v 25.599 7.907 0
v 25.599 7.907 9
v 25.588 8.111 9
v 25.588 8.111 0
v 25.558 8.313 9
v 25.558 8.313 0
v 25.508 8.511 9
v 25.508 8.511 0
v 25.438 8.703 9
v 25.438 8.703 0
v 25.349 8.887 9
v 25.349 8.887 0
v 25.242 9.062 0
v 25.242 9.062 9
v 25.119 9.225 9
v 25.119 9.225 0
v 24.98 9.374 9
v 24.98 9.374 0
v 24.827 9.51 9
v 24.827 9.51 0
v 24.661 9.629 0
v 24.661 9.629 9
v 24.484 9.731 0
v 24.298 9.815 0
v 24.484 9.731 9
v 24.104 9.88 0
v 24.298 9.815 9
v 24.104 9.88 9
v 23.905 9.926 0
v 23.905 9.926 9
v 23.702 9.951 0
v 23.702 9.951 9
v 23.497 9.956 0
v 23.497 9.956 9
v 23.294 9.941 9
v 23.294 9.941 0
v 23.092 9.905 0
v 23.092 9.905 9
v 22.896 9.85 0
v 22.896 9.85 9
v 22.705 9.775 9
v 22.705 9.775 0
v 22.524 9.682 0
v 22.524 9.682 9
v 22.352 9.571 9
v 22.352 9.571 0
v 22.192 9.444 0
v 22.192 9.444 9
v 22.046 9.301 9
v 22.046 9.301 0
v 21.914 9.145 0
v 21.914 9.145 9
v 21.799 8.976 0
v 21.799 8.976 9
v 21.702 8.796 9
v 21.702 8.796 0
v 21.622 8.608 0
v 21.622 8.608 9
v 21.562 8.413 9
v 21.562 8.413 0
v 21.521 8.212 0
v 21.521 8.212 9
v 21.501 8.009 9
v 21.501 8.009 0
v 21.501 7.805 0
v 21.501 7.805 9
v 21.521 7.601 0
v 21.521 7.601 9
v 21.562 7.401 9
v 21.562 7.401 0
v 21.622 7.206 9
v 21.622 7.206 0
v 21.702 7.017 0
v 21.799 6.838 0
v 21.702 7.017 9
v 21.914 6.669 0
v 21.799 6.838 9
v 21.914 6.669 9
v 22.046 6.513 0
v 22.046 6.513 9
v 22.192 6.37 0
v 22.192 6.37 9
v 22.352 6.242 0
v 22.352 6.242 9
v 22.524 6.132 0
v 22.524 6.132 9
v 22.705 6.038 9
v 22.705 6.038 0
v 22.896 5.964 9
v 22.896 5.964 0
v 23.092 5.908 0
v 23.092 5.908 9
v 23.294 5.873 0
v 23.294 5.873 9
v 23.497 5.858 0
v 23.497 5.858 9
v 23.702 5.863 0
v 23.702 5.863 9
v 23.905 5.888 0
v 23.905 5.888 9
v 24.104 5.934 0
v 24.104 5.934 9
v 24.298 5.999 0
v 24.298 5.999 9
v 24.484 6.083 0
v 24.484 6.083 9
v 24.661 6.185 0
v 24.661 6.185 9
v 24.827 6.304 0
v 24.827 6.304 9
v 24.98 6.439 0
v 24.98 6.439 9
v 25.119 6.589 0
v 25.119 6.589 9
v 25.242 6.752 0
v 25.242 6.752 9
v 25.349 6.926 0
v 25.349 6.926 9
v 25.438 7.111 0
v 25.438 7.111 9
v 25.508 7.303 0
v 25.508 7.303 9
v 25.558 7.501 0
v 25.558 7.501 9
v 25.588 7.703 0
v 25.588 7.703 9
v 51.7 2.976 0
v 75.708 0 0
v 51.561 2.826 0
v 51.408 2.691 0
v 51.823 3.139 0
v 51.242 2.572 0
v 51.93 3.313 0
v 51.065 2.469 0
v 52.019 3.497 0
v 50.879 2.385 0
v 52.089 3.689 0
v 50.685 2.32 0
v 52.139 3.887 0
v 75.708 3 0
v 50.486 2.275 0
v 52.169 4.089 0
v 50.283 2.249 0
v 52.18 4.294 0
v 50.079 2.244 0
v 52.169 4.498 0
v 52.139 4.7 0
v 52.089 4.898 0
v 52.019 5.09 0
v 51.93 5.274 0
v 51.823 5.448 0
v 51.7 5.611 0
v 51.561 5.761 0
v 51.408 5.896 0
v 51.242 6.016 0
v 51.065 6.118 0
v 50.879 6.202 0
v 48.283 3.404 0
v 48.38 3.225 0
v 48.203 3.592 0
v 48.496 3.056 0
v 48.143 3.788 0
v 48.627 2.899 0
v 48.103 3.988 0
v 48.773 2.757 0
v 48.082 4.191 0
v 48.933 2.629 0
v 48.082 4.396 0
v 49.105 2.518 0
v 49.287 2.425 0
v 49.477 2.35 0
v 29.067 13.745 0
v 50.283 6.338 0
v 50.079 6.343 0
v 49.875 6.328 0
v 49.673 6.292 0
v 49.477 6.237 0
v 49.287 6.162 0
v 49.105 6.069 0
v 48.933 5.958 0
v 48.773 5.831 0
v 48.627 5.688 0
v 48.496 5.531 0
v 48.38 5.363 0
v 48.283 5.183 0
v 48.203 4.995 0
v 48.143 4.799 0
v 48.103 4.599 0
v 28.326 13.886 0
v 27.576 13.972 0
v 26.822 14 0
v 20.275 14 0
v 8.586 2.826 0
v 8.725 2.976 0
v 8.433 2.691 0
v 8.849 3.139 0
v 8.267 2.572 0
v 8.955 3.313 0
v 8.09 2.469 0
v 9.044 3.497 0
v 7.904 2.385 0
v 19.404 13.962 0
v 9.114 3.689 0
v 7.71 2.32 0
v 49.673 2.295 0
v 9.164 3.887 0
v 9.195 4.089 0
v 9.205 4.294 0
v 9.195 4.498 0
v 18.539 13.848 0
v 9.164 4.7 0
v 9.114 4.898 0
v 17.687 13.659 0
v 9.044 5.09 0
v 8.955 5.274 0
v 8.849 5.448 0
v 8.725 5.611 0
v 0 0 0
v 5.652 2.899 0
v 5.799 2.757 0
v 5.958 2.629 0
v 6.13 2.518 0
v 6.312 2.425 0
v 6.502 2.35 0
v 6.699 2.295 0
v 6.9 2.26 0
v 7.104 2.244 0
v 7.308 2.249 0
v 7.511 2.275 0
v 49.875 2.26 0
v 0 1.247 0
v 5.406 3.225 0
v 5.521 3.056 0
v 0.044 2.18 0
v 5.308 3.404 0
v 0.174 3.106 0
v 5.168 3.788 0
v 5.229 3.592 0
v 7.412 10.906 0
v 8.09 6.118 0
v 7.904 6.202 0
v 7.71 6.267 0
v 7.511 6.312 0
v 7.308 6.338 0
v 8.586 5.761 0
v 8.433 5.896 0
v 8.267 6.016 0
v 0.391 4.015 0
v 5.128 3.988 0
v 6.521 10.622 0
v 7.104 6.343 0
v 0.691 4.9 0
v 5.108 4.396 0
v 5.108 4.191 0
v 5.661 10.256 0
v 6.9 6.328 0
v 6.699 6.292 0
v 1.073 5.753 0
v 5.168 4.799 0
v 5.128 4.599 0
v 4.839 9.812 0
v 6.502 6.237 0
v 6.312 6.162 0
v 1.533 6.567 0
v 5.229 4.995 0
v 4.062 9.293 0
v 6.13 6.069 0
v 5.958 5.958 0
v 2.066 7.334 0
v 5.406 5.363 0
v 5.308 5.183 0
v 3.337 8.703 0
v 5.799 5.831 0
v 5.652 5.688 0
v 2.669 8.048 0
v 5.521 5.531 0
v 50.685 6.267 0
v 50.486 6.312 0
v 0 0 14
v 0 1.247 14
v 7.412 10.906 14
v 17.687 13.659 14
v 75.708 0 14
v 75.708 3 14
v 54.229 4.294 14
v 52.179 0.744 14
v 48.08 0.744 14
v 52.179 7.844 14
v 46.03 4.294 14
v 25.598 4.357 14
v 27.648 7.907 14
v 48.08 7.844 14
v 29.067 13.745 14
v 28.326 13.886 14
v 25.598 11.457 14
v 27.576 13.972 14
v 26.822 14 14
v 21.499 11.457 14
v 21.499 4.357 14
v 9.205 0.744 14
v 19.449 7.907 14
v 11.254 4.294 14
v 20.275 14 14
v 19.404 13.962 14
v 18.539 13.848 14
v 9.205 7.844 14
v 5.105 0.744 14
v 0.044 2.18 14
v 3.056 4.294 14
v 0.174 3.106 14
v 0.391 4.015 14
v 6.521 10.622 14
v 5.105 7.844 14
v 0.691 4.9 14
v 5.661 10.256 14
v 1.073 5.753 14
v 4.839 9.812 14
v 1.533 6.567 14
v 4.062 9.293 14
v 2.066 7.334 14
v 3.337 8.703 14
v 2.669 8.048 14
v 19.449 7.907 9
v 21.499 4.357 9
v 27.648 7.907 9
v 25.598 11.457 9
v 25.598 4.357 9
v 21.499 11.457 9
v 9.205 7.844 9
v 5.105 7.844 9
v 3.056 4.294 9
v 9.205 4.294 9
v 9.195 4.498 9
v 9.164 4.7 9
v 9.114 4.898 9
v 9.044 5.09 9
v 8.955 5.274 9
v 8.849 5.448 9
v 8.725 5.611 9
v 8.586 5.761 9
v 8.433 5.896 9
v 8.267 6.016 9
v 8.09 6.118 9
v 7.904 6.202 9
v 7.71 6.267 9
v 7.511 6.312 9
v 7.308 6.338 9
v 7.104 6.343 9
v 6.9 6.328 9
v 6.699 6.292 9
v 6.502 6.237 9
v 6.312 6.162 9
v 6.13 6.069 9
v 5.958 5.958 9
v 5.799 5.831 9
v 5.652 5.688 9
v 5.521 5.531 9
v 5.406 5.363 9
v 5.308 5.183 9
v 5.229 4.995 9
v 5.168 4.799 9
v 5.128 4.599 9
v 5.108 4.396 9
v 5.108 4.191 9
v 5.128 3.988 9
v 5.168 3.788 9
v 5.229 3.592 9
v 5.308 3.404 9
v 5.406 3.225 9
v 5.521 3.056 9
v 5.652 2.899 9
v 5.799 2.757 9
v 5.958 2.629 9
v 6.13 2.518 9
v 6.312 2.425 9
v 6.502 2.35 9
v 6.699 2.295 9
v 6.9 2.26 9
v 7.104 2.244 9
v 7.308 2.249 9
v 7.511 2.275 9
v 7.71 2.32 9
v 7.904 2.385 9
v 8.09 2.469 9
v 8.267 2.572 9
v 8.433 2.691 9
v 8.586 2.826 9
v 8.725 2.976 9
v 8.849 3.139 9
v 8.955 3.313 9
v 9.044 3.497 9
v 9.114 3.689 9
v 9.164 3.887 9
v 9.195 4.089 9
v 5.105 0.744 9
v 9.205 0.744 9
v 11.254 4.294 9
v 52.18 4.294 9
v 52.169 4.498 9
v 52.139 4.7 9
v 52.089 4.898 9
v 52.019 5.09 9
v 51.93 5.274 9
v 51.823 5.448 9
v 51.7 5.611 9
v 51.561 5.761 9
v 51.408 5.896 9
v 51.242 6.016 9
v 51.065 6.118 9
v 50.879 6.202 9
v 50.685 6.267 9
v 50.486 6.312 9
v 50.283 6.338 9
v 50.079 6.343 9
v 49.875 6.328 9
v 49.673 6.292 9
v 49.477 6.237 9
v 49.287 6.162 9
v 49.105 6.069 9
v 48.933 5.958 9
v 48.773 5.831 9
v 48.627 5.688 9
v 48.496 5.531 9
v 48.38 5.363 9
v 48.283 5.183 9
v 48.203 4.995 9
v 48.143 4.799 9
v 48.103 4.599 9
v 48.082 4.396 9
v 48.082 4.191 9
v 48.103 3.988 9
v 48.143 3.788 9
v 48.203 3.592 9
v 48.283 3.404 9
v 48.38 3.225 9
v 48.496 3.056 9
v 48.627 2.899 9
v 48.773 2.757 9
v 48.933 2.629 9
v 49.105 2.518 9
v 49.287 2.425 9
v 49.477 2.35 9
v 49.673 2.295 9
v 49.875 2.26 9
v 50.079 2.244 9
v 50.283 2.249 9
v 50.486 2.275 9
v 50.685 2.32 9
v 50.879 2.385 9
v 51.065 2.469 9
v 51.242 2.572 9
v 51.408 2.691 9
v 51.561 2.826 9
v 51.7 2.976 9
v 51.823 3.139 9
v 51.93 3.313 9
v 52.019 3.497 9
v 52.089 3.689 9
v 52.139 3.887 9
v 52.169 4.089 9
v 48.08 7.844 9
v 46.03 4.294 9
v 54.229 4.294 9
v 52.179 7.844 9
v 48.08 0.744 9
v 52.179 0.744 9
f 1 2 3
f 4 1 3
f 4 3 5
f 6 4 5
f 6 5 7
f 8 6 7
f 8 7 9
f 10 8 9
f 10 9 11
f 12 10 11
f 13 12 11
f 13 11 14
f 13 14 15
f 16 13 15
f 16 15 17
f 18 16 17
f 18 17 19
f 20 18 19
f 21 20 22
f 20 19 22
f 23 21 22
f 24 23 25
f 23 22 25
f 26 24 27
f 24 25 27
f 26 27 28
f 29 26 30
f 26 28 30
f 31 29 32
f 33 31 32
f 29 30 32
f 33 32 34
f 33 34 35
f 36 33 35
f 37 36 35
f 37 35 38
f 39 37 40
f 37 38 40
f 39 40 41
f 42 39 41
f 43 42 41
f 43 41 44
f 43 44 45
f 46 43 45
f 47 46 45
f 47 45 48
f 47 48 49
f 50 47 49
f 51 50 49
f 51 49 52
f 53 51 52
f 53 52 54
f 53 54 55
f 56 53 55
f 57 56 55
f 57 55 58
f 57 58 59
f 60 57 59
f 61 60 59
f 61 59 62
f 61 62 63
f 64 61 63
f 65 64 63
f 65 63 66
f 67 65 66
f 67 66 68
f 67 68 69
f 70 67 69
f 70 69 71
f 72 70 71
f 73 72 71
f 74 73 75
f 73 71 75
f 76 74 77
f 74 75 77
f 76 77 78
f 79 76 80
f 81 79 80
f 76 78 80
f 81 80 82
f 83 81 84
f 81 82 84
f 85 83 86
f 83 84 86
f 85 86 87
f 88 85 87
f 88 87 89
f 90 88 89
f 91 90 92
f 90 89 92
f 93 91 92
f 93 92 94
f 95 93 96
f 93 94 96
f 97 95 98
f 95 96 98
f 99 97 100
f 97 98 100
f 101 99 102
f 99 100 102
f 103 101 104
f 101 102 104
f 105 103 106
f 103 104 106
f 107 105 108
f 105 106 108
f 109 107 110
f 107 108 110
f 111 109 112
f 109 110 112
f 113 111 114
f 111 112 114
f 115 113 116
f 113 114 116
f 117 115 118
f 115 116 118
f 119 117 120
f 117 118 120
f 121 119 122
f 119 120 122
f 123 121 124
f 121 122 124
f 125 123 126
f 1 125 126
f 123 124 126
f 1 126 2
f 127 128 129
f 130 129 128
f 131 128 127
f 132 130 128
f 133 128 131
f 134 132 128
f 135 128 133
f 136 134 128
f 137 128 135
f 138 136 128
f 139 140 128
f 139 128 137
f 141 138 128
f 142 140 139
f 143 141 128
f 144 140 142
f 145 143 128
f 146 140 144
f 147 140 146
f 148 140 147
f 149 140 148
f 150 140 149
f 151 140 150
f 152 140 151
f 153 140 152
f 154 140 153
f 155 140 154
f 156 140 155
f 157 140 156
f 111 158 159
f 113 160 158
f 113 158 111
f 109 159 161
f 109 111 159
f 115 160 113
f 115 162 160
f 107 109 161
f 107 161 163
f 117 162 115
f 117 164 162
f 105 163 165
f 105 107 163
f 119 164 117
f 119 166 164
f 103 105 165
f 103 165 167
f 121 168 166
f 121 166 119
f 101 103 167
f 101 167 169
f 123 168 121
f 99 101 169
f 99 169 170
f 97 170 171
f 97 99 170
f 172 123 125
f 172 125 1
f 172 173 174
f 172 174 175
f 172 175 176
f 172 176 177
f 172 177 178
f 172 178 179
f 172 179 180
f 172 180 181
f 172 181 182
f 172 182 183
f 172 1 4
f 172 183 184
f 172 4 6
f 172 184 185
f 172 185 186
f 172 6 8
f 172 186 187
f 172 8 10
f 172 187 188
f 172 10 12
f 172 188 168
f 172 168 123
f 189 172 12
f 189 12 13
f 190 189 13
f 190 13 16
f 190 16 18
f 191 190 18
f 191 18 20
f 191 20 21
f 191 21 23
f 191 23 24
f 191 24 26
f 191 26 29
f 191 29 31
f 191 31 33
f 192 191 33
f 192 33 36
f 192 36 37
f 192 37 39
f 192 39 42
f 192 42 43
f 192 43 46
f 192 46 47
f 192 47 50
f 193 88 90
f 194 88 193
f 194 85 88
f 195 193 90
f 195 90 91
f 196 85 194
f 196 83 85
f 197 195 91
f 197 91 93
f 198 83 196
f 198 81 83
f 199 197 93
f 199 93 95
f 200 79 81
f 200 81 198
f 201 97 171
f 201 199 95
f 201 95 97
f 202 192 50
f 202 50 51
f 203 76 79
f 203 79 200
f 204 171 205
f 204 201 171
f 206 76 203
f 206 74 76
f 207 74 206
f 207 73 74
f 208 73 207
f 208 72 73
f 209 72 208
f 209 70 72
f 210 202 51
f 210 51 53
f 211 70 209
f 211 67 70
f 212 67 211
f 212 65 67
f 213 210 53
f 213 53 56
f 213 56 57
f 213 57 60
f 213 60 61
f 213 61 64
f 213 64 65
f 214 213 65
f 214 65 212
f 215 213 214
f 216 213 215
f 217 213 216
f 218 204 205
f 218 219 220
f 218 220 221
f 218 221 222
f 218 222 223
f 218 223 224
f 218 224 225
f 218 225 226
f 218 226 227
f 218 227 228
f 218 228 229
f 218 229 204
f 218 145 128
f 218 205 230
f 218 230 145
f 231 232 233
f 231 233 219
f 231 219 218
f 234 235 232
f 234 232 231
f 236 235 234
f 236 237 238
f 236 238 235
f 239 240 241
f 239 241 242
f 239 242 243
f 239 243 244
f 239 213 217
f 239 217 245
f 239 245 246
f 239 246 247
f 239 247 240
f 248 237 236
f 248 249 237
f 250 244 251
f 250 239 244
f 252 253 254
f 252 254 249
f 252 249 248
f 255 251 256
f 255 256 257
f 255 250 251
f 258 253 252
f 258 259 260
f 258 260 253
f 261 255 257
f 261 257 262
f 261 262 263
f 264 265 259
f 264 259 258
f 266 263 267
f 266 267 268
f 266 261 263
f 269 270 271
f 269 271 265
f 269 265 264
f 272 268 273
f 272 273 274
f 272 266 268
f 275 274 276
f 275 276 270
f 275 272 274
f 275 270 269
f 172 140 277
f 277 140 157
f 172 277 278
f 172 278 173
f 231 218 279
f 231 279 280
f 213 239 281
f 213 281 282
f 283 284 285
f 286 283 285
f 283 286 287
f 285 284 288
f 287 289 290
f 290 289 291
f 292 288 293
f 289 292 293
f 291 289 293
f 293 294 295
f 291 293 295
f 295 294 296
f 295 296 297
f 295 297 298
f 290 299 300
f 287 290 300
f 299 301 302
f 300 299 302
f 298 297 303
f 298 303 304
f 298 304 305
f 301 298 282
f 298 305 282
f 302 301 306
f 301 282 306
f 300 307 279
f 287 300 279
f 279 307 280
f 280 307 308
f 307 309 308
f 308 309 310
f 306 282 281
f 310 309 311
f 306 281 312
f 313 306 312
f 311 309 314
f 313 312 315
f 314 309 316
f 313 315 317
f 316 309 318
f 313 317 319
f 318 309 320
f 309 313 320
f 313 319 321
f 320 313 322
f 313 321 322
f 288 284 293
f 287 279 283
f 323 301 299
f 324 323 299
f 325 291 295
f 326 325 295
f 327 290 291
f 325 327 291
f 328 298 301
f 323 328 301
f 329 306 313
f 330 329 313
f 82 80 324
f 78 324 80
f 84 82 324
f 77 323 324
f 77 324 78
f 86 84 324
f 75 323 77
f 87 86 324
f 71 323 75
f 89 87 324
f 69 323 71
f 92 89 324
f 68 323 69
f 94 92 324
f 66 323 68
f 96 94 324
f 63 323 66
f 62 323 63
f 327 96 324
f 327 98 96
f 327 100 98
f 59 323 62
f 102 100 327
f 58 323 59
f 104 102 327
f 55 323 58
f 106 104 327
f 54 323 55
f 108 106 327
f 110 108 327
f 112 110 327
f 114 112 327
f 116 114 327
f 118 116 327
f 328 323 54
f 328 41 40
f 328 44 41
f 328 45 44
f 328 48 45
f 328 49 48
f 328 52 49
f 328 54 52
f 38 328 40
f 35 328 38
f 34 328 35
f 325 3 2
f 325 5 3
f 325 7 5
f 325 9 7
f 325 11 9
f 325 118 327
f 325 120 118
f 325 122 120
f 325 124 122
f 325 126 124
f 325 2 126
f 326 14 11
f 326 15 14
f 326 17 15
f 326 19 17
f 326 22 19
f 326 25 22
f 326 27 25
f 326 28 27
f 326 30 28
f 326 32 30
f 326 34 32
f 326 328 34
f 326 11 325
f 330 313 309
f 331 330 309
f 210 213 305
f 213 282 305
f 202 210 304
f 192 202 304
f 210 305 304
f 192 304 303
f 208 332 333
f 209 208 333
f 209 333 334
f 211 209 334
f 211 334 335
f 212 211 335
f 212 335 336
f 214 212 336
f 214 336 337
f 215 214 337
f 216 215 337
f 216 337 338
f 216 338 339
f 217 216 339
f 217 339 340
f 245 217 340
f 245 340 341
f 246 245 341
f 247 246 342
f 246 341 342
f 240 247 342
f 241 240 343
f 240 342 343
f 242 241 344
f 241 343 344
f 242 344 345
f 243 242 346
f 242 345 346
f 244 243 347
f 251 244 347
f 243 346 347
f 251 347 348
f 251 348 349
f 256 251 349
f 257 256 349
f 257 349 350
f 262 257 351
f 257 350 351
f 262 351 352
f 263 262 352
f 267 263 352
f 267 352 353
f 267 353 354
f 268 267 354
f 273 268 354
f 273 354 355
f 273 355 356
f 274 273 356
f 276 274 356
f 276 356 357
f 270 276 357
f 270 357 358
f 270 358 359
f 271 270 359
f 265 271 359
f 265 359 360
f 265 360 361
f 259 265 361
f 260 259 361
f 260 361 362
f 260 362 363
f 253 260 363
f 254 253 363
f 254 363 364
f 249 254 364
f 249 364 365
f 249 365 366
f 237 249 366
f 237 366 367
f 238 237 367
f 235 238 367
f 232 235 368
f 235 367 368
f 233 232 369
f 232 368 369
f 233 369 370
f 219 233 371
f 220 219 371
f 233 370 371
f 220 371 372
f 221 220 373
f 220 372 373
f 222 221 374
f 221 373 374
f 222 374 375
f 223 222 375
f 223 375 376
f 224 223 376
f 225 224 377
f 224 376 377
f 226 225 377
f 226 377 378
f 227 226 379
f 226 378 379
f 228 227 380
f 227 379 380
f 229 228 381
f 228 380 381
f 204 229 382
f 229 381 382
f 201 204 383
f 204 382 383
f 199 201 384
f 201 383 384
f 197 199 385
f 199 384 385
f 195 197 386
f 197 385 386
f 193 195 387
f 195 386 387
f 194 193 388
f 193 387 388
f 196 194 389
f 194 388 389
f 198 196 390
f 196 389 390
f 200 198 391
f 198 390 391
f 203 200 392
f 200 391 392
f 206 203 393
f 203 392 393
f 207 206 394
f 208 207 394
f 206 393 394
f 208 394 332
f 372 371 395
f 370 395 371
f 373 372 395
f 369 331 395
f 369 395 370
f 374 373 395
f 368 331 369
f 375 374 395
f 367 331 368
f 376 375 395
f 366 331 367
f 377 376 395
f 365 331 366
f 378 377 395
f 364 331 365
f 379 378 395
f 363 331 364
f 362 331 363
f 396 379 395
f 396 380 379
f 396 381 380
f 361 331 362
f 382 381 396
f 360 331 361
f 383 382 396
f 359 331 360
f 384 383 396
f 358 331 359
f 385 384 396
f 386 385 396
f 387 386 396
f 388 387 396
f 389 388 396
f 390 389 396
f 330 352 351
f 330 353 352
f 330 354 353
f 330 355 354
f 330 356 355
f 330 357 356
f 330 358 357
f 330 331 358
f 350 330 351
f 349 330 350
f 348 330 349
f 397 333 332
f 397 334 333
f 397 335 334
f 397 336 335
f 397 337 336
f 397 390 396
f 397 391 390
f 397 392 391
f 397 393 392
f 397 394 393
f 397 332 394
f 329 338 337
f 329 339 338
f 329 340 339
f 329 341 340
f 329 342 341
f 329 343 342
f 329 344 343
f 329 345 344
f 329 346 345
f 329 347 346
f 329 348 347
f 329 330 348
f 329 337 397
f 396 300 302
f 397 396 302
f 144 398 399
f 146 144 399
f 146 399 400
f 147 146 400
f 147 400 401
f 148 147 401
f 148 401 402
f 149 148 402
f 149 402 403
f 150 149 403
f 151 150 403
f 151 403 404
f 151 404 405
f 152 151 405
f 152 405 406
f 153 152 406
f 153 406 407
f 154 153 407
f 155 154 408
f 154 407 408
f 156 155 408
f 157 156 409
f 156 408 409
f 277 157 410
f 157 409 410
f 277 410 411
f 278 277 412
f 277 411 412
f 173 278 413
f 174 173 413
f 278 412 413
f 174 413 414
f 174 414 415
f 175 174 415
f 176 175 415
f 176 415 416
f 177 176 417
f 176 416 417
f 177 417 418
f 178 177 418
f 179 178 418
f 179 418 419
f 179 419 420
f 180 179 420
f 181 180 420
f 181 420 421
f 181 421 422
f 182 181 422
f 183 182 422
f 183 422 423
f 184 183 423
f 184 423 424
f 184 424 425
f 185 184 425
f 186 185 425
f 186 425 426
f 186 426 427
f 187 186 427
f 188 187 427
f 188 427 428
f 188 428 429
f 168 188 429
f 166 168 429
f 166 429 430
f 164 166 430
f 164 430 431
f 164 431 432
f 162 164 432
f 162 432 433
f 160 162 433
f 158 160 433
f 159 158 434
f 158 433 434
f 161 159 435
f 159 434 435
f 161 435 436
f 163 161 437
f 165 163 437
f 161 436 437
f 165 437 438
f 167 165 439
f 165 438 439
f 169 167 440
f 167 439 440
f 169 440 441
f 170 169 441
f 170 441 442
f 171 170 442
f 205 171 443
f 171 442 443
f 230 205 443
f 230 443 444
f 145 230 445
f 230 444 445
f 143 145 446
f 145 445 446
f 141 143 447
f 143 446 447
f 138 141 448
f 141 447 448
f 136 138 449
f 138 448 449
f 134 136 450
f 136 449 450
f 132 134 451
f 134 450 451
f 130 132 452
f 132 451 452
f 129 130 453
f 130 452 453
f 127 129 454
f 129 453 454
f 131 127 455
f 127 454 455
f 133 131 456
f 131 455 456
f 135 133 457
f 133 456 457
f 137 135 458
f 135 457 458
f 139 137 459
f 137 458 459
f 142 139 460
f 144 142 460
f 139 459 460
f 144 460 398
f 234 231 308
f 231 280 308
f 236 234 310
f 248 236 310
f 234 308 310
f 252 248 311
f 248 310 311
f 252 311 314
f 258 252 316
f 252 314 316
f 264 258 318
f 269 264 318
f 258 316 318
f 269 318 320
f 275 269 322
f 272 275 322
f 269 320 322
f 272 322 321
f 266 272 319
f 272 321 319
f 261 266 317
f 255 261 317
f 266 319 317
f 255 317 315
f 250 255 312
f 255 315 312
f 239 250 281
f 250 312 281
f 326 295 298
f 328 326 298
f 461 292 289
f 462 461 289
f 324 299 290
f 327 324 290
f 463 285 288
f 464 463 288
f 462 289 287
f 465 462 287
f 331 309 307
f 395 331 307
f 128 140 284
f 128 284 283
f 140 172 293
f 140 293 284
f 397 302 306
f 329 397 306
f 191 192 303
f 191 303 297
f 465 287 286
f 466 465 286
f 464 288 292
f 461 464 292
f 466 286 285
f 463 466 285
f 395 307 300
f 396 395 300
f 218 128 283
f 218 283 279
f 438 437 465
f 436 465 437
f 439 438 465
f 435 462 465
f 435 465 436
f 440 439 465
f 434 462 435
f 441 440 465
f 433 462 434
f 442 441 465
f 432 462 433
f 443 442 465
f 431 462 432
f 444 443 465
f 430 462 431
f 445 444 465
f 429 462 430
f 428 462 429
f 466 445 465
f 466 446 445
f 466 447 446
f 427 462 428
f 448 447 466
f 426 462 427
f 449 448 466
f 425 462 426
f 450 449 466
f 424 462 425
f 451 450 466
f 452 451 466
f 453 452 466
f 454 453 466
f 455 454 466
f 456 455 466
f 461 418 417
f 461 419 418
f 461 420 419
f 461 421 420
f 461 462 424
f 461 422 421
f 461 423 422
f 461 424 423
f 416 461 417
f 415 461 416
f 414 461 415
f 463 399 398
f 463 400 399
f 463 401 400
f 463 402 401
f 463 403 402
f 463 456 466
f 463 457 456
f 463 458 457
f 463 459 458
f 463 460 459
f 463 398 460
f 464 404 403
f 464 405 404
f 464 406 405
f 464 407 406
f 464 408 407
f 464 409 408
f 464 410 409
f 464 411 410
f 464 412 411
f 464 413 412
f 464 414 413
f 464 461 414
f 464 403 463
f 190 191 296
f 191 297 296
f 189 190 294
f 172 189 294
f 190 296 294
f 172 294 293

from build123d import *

# Parameters (mm, degrees)
BOSS_EXTRUDE1_DEPTH = 14
FILLET1_R           = 10
FILLET2_R           = 10
CUT_EXTRUDE1_DEPTH  = 5
SKETCH4_R           = 2.05
CUT_EXTRUDE2_DEPTH  = 78.515972824


with BuildPart() as part:
    # Sketch1 → Boss-Extrude1 (new body)
    with BuildSketch(Plane.XY):
        Polygon((0, 0), (0, 8.92), (18.958818102, 14), (27.958818102, 14), (75.708163648, 3), (75.708163648, 0), align=None)
    extrude(amount=BOSS_EXTRUDE1_DEPTH)

    # Fillet1
    fillet1_edges = [part.edges().sort_by_distance(p)[0] for p in [
        (0, 8.92, 7),
    ]]
    fillet(fillet1_edges, radius=FILLET1_R)

    # Fillet2
    fillet2_edges = [part.edges().sort_by_distance(p)[0] for p in [
        (18.958818102, 14, 7),
        (27.958818102, 14, 7),
    ]]
    fillet(fillet2_edges, radius=FILLET2_R)

    # Sketch3 → Cut-Extrude1 (cut)
    with BuildSketch(Plane.XY.offset(14)):
        Polygon((9.204597923, 0.743591352), (11.254191379, 4.293591352), (9.204597923, 7.843591352), (5.105411012, 7.843591352), (3.055817556, 4.293591352), (5.105411012, 0.743591352), align=None)
        Polygon((25.598194748, 4.356888356), (27.647788204, 7.906888356), (25.598194748, 11.456888356), (21.499007837, 11.456888356), (19.449414382, 7.906888356), (21.499007837, 4.356888356), align=None)
        Polygon((52.17923967, 0.743591352), (54.228833126, 4.293591352), (52.17923967, 7.843591352), (48.080052759, 7.843591352), (46.030459303, 4.293591352), (48.080052759, 0.743591352), align=None)
    extrude(amount=-CUT_EXTRUDE1_DEPTH, mode=Mode.SUBTRACT)

    # Sketch4 → Cut-Extrude2 (cut, through all)
    with BuildSketch(Plane.XY.offset(9)):
        with Locations((7.155004468, 4.293591352)):
            Circle(SKETCH4_R)
        with Locations((23.548601293, 7.906888356)):
            Circle(SKETCH4_R)
        with Locations((50.129646215, 4.293591352)):
            Circle(SKETCH4_R)
    extrude(amount=-CUT_EXTRUDE2_DEPTH, mode=Mode.SUBTRACT)


solid = part.part
